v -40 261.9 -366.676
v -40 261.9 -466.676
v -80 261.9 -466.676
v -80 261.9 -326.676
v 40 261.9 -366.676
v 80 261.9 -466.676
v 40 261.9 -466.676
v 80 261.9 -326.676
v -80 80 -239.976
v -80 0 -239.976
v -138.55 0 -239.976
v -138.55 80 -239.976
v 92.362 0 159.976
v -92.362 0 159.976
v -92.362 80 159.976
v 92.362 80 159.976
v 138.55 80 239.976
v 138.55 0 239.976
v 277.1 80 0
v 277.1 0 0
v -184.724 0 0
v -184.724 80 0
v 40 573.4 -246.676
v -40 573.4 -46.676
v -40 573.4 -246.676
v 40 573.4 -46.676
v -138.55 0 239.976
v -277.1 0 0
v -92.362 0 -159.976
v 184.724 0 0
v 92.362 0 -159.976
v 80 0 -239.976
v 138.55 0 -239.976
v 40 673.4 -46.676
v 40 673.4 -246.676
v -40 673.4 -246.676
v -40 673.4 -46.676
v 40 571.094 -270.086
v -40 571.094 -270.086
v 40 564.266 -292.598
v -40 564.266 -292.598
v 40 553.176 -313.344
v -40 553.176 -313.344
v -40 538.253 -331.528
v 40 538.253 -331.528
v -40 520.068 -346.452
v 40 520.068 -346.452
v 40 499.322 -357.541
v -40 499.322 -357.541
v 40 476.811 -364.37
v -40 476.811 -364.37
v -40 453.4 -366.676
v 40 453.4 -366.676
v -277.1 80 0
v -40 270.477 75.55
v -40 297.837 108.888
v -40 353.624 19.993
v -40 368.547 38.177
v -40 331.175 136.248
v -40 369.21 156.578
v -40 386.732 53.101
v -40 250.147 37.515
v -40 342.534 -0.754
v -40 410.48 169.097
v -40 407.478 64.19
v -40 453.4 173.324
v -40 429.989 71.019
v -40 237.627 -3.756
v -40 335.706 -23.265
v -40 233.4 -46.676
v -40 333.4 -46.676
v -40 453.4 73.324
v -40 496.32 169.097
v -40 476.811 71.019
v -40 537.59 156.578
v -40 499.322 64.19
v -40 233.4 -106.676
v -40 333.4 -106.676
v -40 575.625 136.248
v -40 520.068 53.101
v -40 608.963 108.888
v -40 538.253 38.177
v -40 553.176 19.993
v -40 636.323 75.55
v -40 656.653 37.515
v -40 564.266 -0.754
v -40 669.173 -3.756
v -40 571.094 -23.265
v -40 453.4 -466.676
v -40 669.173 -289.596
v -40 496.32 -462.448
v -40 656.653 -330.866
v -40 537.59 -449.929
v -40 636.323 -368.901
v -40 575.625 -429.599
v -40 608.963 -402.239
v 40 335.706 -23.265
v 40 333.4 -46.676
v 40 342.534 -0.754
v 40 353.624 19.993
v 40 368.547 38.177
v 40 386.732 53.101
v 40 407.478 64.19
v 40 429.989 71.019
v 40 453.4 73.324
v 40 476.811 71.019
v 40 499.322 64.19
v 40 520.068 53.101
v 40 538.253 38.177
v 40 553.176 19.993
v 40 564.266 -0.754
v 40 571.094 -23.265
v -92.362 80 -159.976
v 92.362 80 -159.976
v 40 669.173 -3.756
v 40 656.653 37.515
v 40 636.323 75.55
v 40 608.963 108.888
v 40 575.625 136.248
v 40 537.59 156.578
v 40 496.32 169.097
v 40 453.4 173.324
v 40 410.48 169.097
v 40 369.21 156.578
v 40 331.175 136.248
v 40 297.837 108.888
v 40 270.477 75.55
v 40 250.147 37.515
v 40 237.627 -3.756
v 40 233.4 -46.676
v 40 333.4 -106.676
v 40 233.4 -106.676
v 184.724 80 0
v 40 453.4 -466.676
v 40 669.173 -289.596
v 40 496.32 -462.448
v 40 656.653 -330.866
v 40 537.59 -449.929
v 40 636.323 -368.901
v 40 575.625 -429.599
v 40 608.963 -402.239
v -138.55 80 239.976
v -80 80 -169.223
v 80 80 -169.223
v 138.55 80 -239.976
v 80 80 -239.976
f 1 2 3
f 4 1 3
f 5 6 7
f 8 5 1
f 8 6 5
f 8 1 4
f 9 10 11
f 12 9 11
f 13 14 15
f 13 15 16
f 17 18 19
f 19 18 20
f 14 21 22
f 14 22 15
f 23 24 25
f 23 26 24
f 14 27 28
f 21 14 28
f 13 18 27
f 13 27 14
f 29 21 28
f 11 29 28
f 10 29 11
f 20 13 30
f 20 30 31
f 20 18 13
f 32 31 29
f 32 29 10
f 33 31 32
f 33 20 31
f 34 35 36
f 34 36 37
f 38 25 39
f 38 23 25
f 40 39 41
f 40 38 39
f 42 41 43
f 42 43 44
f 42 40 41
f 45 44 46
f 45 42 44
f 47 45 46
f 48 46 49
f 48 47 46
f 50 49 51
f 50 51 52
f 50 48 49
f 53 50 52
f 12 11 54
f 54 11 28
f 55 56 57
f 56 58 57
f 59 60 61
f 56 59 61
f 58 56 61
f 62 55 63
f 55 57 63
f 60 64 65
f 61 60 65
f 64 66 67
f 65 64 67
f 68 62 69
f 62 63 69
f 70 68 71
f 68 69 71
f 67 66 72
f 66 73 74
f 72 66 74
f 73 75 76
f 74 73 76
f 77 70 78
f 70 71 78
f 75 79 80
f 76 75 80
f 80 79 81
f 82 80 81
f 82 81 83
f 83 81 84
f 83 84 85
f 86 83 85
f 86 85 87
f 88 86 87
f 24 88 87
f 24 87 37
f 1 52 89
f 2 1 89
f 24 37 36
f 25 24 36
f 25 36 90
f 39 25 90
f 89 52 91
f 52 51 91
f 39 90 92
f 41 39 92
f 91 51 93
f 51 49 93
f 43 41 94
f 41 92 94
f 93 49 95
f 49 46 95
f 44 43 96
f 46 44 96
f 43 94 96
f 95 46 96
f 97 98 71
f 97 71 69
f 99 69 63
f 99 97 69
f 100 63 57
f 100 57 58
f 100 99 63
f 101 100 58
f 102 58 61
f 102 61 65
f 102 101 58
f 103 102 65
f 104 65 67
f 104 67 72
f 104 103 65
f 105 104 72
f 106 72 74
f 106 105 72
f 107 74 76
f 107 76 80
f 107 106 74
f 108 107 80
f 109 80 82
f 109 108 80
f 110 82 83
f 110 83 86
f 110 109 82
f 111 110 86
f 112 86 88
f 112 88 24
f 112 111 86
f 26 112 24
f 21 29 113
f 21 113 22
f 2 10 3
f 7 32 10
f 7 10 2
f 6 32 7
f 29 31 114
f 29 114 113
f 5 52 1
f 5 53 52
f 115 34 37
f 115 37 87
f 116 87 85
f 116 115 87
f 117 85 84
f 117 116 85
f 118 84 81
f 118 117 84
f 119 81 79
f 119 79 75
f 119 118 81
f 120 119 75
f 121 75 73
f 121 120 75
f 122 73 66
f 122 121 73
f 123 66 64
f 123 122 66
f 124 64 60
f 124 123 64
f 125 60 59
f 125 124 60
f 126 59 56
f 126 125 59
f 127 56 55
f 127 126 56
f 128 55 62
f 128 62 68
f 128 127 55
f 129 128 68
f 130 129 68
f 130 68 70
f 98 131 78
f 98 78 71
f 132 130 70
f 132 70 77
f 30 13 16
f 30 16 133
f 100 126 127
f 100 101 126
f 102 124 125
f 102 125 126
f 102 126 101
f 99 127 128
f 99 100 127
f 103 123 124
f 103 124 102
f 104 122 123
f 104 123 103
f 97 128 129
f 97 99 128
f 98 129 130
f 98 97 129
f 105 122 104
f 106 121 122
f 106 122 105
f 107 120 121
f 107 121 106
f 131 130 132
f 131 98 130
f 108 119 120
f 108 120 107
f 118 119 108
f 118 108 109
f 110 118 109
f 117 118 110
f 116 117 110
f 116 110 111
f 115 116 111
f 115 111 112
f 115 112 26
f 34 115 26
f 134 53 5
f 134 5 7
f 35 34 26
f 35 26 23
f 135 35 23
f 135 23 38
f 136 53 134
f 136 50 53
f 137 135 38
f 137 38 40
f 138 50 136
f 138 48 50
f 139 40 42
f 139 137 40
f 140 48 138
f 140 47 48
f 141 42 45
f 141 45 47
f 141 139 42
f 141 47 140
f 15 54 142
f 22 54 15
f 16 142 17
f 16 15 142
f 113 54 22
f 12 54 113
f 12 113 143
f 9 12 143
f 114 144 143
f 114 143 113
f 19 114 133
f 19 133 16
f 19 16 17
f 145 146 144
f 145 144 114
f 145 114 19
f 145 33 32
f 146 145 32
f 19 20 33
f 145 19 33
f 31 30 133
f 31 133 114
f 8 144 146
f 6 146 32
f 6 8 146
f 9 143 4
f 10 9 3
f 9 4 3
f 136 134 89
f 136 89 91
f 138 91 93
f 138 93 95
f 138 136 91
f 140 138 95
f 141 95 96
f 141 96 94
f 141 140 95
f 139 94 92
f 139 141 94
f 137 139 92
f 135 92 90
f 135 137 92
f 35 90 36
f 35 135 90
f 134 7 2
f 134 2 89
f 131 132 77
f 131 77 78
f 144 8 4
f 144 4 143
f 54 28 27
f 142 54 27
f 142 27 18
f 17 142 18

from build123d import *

# Parameters (mm, degrees)
SALIENTE_EXTRUIR1_DEPTH = 80
SALIENTE_EXTRUIR2_DEPTH = 80
SALIENTE_EXTRUIR4_DEPTH = 40


with BuildPart() as part:
    # Croquis1 → Saliente-Extruir1 (new body)
    with BuildSketch(Plane(origin=(0, 0, 0), x_dir=(1, 0, 0), z_dir=(0, 1, 0))):
        Polygon((-138.55, 239.975639389), (-277.1, 0), (-138.55, -239.975639389), (138.55, -239.975639389), (277.1, 0), (138.55, 239.975639389), align=None)
        Polygon((-92.361978465, 159.975639389), (-184.72395693, 0), (-92.361978465, -159.975639389), (92.361978465, -159.975639389), (184.72395693, 0), (92.361978465, 159.975639389), align=None, mode=Mode.SUBTRACT)
    extrude(amount=SALIENTE_EXTRUIR1_DEPTH)

    # Croquis2 → Saliente-Extruir2 (add, symmetric)
    with BuildSketch(Plane(origin=(0, 0, 0), x_dir=(0, 0, -1), z_dir=(1, 0, 0))):
        Polygon((239.975639389, 0), (466.675639389, 261.9), (326.675639389, 261.9), (169.223443894, 80), (169.223443894, 0), align=None)
    extrude(amount=SALIENTE_EXTRUIR2_DEPTH, both=True)

    # Croquis3 → Saliente-Extruir4 (add, symmetric)
    with BuildSketch(Plane(origin=(0, 0, 0), x_dir=(0, 0, -1), z_dir=(1, 0, 0))):
        with BuildLine():
            Line((366.675639389, 453.4), (366.675639389, 261.9))
            Line((366.675639389, 261.9), (466.675639389, 261.9))
            Line((466.675639389, 261.9), (466.675639389, 453.4))
            ThreePointArc((466.675639389, 453.4), (402.23913125, 608.963491861), (246.675639389, 673.4))
            Line((246.675639389, 673.4), (46.675639389, 673.4))
            ThreePointArc((46.675639389, 673.4), (-173.324360611, 453.4), (46.675639389, 233.4))
            Line((46.675639389, 233.4), (106.675639389, 233.4))
            Line((106.675639389, 233.4), (106.675639389, 333.4))
            Line((106.675639389, 333.4), (46.675639389, 333.4))
            ThreePointArc((46.675639389, 333.4), (-73.324360611, 453.4), (46.675639389, 573.4))
            Line((46.675639389, 573.4), (246.675639389, 573.4))
            ThreePointArc((246.675639389, 573.4), (331.528453131, 538.252813742), (366.675639389, 453.4))
        make_face()
    extrude(amount=SALIENTE_EXTRUIR4_DEPTH, both=True)


solid = part.part
